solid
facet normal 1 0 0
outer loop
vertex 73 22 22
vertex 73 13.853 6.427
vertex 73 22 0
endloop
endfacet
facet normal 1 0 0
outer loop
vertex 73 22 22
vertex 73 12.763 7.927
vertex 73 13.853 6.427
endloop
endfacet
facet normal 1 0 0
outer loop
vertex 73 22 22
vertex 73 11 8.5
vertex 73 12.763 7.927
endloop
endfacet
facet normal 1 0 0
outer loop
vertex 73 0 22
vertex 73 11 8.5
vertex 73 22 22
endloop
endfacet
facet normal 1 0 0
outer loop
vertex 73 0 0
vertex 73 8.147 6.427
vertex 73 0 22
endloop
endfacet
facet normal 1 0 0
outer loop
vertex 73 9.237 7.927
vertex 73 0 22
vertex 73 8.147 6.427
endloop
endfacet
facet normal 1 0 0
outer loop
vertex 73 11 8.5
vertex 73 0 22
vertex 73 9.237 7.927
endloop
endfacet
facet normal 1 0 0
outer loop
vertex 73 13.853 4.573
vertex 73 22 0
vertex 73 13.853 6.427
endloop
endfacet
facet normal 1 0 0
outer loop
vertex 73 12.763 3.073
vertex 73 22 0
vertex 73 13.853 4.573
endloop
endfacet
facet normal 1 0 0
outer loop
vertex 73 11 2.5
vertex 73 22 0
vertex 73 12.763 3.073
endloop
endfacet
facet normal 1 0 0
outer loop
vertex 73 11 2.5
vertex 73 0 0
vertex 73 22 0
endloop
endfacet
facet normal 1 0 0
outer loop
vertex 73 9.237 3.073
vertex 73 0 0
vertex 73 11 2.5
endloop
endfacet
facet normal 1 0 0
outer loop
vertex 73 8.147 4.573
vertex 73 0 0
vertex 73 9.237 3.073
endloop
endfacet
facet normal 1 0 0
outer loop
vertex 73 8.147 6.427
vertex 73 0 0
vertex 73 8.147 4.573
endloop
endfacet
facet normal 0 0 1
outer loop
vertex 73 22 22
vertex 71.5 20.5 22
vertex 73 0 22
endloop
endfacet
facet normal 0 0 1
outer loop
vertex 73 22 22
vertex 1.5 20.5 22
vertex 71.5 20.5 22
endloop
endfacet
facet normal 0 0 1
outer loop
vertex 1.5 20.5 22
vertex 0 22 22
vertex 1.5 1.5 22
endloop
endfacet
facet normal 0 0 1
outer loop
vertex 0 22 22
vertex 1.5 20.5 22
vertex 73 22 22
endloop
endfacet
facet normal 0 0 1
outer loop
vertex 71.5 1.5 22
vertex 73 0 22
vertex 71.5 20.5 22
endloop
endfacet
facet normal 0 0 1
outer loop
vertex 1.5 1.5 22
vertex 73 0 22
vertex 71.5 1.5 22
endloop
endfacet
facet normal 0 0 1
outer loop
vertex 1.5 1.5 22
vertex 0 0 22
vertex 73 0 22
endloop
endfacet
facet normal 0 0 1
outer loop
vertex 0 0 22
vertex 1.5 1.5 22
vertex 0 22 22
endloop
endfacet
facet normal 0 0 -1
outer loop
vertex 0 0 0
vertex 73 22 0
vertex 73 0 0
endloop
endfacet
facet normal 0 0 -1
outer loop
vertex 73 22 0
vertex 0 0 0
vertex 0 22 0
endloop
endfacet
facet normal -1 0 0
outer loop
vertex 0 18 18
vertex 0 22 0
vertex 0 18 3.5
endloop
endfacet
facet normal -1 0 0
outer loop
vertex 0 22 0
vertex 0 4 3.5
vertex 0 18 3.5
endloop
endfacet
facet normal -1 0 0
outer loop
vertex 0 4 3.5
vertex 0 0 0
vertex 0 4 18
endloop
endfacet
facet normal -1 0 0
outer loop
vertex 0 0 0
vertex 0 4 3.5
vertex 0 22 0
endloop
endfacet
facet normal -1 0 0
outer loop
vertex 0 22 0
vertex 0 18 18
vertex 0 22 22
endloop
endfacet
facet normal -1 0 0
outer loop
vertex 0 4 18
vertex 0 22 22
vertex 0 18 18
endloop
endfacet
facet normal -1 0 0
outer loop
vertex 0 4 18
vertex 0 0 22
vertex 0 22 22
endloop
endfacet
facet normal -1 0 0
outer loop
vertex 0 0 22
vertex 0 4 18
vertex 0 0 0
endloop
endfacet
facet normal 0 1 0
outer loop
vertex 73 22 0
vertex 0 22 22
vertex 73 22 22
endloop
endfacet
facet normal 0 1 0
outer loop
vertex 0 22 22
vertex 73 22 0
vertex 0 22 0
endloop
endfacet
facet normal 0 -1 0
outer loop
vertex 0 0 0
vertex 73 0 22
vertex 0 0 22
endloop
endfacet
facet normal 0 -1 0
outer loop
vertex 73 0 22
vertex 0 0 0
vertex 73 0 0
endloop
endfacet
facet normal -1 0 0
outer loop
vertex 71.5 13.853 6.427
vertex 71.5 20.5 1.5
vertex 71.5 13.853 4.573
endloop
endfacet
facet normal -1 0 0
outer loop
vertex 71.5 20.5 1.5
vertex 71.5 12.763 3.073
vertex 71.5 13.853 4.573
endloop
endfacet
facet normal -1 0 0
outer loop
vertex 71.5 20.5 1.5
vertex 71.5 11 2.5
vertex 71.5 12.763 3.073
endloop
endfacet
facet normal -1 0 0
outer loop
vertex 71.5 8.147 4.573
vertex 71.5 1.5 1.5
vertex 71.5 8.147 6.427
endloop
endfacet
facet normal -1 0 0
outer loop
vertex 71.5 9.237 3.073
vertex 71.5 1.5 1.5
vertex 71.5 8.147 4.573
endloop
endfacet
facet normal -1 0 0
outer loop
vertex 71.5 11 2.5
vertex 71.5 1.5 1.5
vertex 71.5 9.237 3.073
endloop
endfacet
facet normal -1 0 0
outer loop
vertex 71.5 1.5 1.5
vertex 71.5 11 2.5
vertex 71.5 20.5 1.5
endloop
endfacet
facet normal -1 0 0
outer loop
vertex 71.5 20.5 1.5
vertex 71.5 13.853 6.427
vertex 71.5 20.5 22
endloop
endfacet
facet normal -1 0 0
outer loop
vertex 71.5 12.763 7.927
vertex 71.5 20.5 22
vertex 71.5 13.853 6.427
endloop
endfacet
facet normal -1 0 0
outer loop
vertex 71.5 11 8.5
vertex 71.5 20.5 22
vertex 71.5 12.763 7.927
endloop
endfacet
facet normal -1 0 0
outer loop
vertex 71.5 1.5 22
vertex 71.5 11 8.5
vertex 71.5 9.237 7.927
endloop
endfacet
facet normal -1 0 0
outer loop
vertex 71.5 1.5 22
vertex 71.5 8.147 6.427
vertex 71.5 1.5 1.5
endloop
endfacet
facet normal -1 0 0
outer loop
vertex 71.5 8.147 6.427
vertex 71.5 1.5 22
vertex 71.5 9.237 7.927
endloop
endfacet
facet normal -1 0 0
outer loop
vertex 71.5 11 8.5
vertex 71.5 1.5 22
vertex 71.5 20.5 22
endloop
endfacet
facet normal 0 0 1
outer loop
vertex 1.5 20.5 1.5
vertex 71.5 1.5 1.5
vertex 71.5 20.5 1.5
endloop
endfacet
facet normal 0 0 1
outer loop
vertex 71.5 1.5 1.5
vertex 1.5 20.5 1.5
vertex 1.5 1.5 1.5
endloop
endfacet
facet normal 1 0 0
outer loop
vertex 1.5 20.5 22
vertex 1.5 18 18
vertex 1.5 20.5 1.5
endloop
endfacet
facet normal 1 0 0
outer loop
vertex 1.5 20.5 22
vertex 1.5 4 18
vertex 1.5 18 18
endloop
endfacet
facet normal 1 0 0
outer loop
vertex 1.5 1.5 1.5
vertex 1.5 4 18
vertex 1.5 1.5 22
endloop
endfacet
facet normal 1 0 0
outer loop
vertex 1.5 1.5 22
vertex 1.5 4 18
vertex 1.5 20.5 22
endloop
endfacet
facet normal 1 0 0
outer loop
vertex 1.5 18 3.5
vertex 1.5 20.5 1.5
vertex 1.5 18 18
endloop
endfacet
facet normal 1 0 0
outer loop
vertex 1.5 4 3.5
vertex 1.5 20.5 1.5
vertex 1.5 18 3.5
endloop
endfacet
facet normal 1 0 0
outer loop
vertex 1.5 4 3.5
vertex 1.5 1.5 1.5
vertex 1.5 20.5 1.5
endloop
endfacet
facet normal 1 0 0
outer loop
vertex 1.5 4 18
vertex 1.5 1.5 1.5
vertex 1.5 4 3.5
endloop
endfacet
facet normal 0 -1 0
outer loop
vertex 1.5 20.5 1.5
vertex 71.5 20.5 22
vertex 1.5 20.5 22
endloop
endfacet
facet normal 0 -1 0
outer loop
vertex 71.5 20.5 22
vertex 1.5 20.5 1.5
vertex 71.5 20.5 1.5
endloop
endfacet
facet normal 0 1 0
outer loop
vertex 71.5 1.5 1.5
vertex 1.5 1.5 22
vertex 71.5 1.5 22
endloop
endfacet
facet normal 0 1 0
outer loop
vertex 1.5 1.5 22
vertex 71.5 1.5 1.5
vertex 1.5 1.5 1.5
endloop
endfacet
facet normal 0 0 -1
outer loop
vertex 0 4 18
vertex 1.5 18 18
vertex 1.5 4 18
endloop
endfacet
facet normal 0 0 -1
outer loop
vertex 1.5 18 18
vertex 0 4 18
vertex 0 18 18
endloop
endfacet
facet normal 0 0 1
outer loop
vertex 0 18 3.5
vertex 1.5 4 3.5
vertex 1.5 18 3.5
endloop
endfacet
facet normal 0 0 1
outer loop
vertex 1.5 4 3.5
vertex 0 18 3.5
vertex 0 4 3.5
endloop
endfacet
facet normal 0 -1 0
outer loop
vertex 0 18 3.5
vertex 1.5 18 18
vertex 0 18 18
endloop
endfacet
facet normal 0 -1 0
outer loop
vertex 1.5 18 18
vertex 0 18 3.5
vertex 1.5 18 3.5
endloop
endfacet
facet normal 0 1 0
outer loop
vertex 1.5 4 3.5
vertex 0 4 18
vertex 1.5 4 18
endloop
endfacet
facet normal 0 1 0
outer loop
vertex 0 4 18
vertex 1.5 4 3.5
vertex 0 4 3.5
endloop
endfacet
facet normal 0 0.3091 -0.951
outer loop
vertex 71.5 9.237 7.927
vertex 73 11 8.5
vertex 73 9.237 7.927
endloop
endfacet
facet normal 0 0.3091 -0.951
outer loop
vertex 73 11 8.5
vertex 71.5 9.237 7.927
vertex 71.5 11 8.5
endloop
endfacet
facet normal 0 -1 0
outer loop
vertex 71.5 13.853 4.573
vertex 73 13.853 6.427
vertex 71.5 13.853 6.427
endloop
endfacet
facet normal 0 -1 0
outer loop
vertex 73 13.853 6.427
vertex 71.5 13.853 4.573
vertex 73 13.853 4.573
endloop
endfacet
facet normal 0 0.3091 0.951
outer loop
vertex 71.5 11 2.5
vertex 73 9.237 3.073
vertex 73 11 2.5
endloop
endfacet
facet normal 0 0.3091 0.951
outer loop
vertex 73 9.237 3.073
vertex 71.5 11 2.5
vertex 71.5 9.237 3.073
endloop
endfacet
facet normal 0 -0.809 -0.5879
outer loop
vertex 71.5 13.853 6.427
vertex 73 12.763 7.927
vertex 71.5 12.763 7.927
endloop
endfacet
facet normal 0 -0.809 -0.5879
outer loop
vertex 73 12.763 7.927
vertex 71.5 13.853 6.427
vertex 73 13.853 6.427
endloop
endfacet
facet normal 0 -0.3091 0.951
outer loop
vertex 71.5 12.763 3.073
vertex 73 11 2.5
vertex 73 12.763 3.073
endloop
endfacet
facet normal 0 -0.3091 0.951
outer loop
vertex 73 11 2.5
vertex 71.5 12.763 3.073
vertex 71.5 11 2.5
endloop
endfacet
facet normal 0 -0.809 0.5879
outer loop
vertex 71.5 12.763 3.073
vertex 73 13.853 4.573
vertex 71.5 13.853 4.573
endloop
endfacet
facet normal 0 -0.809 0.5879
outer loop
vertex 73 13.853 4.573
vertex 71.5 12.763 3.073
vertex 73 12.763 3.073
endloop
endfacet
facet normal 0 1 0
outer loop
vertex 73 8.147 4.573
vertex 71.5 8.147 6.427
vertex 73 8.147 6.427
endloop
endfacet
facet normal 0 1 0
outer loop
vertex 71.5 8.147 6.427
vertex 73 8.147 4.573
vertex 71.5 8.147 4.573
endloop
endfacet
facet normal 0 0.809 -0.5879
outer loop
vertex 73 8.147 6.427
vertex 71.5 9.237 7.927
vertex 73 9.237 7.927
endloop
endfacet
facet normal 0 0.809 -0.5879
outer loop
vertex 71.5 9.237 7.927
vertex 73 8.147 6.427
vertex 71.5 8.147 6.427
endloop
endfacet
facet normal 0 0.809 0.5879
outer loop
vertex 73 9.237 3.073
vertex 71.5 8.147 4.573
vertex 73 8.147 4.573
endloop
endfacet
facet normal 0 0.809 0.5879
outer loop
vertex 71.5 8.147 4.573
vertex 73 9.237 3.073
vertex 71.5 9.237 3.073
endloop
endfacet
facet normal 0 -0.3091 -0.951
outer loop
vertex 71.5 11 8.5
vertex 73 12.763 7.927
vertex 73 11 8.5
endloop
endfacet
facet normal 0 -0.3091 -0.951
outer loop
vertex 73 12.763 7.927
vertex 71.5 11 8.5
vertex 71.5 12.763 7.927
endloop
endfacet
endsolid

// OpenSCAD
Wall   = 1.5; // Wall thickness
//Inner Widths
Length = 70+Wall*2; // X axis
Width  = 19+Wall*2; // Y
Height = 22; // Z


difference(){
  cube([Length,Width,Height]);  
  translate([Wall,Wall,Wall]) {
    cube([Length-(Wall*2),Width-(Wall*2),Height]);
  }
  translate([0,(Width-14)/2,3.5]) {
    cube([Wall, 14, 14.5]);
  }
  #translate([Length-Wall,Width/2, Height/4]) {
    rotate([0,90,0]) cylinder(Wall,3,3,false);
  }
}
